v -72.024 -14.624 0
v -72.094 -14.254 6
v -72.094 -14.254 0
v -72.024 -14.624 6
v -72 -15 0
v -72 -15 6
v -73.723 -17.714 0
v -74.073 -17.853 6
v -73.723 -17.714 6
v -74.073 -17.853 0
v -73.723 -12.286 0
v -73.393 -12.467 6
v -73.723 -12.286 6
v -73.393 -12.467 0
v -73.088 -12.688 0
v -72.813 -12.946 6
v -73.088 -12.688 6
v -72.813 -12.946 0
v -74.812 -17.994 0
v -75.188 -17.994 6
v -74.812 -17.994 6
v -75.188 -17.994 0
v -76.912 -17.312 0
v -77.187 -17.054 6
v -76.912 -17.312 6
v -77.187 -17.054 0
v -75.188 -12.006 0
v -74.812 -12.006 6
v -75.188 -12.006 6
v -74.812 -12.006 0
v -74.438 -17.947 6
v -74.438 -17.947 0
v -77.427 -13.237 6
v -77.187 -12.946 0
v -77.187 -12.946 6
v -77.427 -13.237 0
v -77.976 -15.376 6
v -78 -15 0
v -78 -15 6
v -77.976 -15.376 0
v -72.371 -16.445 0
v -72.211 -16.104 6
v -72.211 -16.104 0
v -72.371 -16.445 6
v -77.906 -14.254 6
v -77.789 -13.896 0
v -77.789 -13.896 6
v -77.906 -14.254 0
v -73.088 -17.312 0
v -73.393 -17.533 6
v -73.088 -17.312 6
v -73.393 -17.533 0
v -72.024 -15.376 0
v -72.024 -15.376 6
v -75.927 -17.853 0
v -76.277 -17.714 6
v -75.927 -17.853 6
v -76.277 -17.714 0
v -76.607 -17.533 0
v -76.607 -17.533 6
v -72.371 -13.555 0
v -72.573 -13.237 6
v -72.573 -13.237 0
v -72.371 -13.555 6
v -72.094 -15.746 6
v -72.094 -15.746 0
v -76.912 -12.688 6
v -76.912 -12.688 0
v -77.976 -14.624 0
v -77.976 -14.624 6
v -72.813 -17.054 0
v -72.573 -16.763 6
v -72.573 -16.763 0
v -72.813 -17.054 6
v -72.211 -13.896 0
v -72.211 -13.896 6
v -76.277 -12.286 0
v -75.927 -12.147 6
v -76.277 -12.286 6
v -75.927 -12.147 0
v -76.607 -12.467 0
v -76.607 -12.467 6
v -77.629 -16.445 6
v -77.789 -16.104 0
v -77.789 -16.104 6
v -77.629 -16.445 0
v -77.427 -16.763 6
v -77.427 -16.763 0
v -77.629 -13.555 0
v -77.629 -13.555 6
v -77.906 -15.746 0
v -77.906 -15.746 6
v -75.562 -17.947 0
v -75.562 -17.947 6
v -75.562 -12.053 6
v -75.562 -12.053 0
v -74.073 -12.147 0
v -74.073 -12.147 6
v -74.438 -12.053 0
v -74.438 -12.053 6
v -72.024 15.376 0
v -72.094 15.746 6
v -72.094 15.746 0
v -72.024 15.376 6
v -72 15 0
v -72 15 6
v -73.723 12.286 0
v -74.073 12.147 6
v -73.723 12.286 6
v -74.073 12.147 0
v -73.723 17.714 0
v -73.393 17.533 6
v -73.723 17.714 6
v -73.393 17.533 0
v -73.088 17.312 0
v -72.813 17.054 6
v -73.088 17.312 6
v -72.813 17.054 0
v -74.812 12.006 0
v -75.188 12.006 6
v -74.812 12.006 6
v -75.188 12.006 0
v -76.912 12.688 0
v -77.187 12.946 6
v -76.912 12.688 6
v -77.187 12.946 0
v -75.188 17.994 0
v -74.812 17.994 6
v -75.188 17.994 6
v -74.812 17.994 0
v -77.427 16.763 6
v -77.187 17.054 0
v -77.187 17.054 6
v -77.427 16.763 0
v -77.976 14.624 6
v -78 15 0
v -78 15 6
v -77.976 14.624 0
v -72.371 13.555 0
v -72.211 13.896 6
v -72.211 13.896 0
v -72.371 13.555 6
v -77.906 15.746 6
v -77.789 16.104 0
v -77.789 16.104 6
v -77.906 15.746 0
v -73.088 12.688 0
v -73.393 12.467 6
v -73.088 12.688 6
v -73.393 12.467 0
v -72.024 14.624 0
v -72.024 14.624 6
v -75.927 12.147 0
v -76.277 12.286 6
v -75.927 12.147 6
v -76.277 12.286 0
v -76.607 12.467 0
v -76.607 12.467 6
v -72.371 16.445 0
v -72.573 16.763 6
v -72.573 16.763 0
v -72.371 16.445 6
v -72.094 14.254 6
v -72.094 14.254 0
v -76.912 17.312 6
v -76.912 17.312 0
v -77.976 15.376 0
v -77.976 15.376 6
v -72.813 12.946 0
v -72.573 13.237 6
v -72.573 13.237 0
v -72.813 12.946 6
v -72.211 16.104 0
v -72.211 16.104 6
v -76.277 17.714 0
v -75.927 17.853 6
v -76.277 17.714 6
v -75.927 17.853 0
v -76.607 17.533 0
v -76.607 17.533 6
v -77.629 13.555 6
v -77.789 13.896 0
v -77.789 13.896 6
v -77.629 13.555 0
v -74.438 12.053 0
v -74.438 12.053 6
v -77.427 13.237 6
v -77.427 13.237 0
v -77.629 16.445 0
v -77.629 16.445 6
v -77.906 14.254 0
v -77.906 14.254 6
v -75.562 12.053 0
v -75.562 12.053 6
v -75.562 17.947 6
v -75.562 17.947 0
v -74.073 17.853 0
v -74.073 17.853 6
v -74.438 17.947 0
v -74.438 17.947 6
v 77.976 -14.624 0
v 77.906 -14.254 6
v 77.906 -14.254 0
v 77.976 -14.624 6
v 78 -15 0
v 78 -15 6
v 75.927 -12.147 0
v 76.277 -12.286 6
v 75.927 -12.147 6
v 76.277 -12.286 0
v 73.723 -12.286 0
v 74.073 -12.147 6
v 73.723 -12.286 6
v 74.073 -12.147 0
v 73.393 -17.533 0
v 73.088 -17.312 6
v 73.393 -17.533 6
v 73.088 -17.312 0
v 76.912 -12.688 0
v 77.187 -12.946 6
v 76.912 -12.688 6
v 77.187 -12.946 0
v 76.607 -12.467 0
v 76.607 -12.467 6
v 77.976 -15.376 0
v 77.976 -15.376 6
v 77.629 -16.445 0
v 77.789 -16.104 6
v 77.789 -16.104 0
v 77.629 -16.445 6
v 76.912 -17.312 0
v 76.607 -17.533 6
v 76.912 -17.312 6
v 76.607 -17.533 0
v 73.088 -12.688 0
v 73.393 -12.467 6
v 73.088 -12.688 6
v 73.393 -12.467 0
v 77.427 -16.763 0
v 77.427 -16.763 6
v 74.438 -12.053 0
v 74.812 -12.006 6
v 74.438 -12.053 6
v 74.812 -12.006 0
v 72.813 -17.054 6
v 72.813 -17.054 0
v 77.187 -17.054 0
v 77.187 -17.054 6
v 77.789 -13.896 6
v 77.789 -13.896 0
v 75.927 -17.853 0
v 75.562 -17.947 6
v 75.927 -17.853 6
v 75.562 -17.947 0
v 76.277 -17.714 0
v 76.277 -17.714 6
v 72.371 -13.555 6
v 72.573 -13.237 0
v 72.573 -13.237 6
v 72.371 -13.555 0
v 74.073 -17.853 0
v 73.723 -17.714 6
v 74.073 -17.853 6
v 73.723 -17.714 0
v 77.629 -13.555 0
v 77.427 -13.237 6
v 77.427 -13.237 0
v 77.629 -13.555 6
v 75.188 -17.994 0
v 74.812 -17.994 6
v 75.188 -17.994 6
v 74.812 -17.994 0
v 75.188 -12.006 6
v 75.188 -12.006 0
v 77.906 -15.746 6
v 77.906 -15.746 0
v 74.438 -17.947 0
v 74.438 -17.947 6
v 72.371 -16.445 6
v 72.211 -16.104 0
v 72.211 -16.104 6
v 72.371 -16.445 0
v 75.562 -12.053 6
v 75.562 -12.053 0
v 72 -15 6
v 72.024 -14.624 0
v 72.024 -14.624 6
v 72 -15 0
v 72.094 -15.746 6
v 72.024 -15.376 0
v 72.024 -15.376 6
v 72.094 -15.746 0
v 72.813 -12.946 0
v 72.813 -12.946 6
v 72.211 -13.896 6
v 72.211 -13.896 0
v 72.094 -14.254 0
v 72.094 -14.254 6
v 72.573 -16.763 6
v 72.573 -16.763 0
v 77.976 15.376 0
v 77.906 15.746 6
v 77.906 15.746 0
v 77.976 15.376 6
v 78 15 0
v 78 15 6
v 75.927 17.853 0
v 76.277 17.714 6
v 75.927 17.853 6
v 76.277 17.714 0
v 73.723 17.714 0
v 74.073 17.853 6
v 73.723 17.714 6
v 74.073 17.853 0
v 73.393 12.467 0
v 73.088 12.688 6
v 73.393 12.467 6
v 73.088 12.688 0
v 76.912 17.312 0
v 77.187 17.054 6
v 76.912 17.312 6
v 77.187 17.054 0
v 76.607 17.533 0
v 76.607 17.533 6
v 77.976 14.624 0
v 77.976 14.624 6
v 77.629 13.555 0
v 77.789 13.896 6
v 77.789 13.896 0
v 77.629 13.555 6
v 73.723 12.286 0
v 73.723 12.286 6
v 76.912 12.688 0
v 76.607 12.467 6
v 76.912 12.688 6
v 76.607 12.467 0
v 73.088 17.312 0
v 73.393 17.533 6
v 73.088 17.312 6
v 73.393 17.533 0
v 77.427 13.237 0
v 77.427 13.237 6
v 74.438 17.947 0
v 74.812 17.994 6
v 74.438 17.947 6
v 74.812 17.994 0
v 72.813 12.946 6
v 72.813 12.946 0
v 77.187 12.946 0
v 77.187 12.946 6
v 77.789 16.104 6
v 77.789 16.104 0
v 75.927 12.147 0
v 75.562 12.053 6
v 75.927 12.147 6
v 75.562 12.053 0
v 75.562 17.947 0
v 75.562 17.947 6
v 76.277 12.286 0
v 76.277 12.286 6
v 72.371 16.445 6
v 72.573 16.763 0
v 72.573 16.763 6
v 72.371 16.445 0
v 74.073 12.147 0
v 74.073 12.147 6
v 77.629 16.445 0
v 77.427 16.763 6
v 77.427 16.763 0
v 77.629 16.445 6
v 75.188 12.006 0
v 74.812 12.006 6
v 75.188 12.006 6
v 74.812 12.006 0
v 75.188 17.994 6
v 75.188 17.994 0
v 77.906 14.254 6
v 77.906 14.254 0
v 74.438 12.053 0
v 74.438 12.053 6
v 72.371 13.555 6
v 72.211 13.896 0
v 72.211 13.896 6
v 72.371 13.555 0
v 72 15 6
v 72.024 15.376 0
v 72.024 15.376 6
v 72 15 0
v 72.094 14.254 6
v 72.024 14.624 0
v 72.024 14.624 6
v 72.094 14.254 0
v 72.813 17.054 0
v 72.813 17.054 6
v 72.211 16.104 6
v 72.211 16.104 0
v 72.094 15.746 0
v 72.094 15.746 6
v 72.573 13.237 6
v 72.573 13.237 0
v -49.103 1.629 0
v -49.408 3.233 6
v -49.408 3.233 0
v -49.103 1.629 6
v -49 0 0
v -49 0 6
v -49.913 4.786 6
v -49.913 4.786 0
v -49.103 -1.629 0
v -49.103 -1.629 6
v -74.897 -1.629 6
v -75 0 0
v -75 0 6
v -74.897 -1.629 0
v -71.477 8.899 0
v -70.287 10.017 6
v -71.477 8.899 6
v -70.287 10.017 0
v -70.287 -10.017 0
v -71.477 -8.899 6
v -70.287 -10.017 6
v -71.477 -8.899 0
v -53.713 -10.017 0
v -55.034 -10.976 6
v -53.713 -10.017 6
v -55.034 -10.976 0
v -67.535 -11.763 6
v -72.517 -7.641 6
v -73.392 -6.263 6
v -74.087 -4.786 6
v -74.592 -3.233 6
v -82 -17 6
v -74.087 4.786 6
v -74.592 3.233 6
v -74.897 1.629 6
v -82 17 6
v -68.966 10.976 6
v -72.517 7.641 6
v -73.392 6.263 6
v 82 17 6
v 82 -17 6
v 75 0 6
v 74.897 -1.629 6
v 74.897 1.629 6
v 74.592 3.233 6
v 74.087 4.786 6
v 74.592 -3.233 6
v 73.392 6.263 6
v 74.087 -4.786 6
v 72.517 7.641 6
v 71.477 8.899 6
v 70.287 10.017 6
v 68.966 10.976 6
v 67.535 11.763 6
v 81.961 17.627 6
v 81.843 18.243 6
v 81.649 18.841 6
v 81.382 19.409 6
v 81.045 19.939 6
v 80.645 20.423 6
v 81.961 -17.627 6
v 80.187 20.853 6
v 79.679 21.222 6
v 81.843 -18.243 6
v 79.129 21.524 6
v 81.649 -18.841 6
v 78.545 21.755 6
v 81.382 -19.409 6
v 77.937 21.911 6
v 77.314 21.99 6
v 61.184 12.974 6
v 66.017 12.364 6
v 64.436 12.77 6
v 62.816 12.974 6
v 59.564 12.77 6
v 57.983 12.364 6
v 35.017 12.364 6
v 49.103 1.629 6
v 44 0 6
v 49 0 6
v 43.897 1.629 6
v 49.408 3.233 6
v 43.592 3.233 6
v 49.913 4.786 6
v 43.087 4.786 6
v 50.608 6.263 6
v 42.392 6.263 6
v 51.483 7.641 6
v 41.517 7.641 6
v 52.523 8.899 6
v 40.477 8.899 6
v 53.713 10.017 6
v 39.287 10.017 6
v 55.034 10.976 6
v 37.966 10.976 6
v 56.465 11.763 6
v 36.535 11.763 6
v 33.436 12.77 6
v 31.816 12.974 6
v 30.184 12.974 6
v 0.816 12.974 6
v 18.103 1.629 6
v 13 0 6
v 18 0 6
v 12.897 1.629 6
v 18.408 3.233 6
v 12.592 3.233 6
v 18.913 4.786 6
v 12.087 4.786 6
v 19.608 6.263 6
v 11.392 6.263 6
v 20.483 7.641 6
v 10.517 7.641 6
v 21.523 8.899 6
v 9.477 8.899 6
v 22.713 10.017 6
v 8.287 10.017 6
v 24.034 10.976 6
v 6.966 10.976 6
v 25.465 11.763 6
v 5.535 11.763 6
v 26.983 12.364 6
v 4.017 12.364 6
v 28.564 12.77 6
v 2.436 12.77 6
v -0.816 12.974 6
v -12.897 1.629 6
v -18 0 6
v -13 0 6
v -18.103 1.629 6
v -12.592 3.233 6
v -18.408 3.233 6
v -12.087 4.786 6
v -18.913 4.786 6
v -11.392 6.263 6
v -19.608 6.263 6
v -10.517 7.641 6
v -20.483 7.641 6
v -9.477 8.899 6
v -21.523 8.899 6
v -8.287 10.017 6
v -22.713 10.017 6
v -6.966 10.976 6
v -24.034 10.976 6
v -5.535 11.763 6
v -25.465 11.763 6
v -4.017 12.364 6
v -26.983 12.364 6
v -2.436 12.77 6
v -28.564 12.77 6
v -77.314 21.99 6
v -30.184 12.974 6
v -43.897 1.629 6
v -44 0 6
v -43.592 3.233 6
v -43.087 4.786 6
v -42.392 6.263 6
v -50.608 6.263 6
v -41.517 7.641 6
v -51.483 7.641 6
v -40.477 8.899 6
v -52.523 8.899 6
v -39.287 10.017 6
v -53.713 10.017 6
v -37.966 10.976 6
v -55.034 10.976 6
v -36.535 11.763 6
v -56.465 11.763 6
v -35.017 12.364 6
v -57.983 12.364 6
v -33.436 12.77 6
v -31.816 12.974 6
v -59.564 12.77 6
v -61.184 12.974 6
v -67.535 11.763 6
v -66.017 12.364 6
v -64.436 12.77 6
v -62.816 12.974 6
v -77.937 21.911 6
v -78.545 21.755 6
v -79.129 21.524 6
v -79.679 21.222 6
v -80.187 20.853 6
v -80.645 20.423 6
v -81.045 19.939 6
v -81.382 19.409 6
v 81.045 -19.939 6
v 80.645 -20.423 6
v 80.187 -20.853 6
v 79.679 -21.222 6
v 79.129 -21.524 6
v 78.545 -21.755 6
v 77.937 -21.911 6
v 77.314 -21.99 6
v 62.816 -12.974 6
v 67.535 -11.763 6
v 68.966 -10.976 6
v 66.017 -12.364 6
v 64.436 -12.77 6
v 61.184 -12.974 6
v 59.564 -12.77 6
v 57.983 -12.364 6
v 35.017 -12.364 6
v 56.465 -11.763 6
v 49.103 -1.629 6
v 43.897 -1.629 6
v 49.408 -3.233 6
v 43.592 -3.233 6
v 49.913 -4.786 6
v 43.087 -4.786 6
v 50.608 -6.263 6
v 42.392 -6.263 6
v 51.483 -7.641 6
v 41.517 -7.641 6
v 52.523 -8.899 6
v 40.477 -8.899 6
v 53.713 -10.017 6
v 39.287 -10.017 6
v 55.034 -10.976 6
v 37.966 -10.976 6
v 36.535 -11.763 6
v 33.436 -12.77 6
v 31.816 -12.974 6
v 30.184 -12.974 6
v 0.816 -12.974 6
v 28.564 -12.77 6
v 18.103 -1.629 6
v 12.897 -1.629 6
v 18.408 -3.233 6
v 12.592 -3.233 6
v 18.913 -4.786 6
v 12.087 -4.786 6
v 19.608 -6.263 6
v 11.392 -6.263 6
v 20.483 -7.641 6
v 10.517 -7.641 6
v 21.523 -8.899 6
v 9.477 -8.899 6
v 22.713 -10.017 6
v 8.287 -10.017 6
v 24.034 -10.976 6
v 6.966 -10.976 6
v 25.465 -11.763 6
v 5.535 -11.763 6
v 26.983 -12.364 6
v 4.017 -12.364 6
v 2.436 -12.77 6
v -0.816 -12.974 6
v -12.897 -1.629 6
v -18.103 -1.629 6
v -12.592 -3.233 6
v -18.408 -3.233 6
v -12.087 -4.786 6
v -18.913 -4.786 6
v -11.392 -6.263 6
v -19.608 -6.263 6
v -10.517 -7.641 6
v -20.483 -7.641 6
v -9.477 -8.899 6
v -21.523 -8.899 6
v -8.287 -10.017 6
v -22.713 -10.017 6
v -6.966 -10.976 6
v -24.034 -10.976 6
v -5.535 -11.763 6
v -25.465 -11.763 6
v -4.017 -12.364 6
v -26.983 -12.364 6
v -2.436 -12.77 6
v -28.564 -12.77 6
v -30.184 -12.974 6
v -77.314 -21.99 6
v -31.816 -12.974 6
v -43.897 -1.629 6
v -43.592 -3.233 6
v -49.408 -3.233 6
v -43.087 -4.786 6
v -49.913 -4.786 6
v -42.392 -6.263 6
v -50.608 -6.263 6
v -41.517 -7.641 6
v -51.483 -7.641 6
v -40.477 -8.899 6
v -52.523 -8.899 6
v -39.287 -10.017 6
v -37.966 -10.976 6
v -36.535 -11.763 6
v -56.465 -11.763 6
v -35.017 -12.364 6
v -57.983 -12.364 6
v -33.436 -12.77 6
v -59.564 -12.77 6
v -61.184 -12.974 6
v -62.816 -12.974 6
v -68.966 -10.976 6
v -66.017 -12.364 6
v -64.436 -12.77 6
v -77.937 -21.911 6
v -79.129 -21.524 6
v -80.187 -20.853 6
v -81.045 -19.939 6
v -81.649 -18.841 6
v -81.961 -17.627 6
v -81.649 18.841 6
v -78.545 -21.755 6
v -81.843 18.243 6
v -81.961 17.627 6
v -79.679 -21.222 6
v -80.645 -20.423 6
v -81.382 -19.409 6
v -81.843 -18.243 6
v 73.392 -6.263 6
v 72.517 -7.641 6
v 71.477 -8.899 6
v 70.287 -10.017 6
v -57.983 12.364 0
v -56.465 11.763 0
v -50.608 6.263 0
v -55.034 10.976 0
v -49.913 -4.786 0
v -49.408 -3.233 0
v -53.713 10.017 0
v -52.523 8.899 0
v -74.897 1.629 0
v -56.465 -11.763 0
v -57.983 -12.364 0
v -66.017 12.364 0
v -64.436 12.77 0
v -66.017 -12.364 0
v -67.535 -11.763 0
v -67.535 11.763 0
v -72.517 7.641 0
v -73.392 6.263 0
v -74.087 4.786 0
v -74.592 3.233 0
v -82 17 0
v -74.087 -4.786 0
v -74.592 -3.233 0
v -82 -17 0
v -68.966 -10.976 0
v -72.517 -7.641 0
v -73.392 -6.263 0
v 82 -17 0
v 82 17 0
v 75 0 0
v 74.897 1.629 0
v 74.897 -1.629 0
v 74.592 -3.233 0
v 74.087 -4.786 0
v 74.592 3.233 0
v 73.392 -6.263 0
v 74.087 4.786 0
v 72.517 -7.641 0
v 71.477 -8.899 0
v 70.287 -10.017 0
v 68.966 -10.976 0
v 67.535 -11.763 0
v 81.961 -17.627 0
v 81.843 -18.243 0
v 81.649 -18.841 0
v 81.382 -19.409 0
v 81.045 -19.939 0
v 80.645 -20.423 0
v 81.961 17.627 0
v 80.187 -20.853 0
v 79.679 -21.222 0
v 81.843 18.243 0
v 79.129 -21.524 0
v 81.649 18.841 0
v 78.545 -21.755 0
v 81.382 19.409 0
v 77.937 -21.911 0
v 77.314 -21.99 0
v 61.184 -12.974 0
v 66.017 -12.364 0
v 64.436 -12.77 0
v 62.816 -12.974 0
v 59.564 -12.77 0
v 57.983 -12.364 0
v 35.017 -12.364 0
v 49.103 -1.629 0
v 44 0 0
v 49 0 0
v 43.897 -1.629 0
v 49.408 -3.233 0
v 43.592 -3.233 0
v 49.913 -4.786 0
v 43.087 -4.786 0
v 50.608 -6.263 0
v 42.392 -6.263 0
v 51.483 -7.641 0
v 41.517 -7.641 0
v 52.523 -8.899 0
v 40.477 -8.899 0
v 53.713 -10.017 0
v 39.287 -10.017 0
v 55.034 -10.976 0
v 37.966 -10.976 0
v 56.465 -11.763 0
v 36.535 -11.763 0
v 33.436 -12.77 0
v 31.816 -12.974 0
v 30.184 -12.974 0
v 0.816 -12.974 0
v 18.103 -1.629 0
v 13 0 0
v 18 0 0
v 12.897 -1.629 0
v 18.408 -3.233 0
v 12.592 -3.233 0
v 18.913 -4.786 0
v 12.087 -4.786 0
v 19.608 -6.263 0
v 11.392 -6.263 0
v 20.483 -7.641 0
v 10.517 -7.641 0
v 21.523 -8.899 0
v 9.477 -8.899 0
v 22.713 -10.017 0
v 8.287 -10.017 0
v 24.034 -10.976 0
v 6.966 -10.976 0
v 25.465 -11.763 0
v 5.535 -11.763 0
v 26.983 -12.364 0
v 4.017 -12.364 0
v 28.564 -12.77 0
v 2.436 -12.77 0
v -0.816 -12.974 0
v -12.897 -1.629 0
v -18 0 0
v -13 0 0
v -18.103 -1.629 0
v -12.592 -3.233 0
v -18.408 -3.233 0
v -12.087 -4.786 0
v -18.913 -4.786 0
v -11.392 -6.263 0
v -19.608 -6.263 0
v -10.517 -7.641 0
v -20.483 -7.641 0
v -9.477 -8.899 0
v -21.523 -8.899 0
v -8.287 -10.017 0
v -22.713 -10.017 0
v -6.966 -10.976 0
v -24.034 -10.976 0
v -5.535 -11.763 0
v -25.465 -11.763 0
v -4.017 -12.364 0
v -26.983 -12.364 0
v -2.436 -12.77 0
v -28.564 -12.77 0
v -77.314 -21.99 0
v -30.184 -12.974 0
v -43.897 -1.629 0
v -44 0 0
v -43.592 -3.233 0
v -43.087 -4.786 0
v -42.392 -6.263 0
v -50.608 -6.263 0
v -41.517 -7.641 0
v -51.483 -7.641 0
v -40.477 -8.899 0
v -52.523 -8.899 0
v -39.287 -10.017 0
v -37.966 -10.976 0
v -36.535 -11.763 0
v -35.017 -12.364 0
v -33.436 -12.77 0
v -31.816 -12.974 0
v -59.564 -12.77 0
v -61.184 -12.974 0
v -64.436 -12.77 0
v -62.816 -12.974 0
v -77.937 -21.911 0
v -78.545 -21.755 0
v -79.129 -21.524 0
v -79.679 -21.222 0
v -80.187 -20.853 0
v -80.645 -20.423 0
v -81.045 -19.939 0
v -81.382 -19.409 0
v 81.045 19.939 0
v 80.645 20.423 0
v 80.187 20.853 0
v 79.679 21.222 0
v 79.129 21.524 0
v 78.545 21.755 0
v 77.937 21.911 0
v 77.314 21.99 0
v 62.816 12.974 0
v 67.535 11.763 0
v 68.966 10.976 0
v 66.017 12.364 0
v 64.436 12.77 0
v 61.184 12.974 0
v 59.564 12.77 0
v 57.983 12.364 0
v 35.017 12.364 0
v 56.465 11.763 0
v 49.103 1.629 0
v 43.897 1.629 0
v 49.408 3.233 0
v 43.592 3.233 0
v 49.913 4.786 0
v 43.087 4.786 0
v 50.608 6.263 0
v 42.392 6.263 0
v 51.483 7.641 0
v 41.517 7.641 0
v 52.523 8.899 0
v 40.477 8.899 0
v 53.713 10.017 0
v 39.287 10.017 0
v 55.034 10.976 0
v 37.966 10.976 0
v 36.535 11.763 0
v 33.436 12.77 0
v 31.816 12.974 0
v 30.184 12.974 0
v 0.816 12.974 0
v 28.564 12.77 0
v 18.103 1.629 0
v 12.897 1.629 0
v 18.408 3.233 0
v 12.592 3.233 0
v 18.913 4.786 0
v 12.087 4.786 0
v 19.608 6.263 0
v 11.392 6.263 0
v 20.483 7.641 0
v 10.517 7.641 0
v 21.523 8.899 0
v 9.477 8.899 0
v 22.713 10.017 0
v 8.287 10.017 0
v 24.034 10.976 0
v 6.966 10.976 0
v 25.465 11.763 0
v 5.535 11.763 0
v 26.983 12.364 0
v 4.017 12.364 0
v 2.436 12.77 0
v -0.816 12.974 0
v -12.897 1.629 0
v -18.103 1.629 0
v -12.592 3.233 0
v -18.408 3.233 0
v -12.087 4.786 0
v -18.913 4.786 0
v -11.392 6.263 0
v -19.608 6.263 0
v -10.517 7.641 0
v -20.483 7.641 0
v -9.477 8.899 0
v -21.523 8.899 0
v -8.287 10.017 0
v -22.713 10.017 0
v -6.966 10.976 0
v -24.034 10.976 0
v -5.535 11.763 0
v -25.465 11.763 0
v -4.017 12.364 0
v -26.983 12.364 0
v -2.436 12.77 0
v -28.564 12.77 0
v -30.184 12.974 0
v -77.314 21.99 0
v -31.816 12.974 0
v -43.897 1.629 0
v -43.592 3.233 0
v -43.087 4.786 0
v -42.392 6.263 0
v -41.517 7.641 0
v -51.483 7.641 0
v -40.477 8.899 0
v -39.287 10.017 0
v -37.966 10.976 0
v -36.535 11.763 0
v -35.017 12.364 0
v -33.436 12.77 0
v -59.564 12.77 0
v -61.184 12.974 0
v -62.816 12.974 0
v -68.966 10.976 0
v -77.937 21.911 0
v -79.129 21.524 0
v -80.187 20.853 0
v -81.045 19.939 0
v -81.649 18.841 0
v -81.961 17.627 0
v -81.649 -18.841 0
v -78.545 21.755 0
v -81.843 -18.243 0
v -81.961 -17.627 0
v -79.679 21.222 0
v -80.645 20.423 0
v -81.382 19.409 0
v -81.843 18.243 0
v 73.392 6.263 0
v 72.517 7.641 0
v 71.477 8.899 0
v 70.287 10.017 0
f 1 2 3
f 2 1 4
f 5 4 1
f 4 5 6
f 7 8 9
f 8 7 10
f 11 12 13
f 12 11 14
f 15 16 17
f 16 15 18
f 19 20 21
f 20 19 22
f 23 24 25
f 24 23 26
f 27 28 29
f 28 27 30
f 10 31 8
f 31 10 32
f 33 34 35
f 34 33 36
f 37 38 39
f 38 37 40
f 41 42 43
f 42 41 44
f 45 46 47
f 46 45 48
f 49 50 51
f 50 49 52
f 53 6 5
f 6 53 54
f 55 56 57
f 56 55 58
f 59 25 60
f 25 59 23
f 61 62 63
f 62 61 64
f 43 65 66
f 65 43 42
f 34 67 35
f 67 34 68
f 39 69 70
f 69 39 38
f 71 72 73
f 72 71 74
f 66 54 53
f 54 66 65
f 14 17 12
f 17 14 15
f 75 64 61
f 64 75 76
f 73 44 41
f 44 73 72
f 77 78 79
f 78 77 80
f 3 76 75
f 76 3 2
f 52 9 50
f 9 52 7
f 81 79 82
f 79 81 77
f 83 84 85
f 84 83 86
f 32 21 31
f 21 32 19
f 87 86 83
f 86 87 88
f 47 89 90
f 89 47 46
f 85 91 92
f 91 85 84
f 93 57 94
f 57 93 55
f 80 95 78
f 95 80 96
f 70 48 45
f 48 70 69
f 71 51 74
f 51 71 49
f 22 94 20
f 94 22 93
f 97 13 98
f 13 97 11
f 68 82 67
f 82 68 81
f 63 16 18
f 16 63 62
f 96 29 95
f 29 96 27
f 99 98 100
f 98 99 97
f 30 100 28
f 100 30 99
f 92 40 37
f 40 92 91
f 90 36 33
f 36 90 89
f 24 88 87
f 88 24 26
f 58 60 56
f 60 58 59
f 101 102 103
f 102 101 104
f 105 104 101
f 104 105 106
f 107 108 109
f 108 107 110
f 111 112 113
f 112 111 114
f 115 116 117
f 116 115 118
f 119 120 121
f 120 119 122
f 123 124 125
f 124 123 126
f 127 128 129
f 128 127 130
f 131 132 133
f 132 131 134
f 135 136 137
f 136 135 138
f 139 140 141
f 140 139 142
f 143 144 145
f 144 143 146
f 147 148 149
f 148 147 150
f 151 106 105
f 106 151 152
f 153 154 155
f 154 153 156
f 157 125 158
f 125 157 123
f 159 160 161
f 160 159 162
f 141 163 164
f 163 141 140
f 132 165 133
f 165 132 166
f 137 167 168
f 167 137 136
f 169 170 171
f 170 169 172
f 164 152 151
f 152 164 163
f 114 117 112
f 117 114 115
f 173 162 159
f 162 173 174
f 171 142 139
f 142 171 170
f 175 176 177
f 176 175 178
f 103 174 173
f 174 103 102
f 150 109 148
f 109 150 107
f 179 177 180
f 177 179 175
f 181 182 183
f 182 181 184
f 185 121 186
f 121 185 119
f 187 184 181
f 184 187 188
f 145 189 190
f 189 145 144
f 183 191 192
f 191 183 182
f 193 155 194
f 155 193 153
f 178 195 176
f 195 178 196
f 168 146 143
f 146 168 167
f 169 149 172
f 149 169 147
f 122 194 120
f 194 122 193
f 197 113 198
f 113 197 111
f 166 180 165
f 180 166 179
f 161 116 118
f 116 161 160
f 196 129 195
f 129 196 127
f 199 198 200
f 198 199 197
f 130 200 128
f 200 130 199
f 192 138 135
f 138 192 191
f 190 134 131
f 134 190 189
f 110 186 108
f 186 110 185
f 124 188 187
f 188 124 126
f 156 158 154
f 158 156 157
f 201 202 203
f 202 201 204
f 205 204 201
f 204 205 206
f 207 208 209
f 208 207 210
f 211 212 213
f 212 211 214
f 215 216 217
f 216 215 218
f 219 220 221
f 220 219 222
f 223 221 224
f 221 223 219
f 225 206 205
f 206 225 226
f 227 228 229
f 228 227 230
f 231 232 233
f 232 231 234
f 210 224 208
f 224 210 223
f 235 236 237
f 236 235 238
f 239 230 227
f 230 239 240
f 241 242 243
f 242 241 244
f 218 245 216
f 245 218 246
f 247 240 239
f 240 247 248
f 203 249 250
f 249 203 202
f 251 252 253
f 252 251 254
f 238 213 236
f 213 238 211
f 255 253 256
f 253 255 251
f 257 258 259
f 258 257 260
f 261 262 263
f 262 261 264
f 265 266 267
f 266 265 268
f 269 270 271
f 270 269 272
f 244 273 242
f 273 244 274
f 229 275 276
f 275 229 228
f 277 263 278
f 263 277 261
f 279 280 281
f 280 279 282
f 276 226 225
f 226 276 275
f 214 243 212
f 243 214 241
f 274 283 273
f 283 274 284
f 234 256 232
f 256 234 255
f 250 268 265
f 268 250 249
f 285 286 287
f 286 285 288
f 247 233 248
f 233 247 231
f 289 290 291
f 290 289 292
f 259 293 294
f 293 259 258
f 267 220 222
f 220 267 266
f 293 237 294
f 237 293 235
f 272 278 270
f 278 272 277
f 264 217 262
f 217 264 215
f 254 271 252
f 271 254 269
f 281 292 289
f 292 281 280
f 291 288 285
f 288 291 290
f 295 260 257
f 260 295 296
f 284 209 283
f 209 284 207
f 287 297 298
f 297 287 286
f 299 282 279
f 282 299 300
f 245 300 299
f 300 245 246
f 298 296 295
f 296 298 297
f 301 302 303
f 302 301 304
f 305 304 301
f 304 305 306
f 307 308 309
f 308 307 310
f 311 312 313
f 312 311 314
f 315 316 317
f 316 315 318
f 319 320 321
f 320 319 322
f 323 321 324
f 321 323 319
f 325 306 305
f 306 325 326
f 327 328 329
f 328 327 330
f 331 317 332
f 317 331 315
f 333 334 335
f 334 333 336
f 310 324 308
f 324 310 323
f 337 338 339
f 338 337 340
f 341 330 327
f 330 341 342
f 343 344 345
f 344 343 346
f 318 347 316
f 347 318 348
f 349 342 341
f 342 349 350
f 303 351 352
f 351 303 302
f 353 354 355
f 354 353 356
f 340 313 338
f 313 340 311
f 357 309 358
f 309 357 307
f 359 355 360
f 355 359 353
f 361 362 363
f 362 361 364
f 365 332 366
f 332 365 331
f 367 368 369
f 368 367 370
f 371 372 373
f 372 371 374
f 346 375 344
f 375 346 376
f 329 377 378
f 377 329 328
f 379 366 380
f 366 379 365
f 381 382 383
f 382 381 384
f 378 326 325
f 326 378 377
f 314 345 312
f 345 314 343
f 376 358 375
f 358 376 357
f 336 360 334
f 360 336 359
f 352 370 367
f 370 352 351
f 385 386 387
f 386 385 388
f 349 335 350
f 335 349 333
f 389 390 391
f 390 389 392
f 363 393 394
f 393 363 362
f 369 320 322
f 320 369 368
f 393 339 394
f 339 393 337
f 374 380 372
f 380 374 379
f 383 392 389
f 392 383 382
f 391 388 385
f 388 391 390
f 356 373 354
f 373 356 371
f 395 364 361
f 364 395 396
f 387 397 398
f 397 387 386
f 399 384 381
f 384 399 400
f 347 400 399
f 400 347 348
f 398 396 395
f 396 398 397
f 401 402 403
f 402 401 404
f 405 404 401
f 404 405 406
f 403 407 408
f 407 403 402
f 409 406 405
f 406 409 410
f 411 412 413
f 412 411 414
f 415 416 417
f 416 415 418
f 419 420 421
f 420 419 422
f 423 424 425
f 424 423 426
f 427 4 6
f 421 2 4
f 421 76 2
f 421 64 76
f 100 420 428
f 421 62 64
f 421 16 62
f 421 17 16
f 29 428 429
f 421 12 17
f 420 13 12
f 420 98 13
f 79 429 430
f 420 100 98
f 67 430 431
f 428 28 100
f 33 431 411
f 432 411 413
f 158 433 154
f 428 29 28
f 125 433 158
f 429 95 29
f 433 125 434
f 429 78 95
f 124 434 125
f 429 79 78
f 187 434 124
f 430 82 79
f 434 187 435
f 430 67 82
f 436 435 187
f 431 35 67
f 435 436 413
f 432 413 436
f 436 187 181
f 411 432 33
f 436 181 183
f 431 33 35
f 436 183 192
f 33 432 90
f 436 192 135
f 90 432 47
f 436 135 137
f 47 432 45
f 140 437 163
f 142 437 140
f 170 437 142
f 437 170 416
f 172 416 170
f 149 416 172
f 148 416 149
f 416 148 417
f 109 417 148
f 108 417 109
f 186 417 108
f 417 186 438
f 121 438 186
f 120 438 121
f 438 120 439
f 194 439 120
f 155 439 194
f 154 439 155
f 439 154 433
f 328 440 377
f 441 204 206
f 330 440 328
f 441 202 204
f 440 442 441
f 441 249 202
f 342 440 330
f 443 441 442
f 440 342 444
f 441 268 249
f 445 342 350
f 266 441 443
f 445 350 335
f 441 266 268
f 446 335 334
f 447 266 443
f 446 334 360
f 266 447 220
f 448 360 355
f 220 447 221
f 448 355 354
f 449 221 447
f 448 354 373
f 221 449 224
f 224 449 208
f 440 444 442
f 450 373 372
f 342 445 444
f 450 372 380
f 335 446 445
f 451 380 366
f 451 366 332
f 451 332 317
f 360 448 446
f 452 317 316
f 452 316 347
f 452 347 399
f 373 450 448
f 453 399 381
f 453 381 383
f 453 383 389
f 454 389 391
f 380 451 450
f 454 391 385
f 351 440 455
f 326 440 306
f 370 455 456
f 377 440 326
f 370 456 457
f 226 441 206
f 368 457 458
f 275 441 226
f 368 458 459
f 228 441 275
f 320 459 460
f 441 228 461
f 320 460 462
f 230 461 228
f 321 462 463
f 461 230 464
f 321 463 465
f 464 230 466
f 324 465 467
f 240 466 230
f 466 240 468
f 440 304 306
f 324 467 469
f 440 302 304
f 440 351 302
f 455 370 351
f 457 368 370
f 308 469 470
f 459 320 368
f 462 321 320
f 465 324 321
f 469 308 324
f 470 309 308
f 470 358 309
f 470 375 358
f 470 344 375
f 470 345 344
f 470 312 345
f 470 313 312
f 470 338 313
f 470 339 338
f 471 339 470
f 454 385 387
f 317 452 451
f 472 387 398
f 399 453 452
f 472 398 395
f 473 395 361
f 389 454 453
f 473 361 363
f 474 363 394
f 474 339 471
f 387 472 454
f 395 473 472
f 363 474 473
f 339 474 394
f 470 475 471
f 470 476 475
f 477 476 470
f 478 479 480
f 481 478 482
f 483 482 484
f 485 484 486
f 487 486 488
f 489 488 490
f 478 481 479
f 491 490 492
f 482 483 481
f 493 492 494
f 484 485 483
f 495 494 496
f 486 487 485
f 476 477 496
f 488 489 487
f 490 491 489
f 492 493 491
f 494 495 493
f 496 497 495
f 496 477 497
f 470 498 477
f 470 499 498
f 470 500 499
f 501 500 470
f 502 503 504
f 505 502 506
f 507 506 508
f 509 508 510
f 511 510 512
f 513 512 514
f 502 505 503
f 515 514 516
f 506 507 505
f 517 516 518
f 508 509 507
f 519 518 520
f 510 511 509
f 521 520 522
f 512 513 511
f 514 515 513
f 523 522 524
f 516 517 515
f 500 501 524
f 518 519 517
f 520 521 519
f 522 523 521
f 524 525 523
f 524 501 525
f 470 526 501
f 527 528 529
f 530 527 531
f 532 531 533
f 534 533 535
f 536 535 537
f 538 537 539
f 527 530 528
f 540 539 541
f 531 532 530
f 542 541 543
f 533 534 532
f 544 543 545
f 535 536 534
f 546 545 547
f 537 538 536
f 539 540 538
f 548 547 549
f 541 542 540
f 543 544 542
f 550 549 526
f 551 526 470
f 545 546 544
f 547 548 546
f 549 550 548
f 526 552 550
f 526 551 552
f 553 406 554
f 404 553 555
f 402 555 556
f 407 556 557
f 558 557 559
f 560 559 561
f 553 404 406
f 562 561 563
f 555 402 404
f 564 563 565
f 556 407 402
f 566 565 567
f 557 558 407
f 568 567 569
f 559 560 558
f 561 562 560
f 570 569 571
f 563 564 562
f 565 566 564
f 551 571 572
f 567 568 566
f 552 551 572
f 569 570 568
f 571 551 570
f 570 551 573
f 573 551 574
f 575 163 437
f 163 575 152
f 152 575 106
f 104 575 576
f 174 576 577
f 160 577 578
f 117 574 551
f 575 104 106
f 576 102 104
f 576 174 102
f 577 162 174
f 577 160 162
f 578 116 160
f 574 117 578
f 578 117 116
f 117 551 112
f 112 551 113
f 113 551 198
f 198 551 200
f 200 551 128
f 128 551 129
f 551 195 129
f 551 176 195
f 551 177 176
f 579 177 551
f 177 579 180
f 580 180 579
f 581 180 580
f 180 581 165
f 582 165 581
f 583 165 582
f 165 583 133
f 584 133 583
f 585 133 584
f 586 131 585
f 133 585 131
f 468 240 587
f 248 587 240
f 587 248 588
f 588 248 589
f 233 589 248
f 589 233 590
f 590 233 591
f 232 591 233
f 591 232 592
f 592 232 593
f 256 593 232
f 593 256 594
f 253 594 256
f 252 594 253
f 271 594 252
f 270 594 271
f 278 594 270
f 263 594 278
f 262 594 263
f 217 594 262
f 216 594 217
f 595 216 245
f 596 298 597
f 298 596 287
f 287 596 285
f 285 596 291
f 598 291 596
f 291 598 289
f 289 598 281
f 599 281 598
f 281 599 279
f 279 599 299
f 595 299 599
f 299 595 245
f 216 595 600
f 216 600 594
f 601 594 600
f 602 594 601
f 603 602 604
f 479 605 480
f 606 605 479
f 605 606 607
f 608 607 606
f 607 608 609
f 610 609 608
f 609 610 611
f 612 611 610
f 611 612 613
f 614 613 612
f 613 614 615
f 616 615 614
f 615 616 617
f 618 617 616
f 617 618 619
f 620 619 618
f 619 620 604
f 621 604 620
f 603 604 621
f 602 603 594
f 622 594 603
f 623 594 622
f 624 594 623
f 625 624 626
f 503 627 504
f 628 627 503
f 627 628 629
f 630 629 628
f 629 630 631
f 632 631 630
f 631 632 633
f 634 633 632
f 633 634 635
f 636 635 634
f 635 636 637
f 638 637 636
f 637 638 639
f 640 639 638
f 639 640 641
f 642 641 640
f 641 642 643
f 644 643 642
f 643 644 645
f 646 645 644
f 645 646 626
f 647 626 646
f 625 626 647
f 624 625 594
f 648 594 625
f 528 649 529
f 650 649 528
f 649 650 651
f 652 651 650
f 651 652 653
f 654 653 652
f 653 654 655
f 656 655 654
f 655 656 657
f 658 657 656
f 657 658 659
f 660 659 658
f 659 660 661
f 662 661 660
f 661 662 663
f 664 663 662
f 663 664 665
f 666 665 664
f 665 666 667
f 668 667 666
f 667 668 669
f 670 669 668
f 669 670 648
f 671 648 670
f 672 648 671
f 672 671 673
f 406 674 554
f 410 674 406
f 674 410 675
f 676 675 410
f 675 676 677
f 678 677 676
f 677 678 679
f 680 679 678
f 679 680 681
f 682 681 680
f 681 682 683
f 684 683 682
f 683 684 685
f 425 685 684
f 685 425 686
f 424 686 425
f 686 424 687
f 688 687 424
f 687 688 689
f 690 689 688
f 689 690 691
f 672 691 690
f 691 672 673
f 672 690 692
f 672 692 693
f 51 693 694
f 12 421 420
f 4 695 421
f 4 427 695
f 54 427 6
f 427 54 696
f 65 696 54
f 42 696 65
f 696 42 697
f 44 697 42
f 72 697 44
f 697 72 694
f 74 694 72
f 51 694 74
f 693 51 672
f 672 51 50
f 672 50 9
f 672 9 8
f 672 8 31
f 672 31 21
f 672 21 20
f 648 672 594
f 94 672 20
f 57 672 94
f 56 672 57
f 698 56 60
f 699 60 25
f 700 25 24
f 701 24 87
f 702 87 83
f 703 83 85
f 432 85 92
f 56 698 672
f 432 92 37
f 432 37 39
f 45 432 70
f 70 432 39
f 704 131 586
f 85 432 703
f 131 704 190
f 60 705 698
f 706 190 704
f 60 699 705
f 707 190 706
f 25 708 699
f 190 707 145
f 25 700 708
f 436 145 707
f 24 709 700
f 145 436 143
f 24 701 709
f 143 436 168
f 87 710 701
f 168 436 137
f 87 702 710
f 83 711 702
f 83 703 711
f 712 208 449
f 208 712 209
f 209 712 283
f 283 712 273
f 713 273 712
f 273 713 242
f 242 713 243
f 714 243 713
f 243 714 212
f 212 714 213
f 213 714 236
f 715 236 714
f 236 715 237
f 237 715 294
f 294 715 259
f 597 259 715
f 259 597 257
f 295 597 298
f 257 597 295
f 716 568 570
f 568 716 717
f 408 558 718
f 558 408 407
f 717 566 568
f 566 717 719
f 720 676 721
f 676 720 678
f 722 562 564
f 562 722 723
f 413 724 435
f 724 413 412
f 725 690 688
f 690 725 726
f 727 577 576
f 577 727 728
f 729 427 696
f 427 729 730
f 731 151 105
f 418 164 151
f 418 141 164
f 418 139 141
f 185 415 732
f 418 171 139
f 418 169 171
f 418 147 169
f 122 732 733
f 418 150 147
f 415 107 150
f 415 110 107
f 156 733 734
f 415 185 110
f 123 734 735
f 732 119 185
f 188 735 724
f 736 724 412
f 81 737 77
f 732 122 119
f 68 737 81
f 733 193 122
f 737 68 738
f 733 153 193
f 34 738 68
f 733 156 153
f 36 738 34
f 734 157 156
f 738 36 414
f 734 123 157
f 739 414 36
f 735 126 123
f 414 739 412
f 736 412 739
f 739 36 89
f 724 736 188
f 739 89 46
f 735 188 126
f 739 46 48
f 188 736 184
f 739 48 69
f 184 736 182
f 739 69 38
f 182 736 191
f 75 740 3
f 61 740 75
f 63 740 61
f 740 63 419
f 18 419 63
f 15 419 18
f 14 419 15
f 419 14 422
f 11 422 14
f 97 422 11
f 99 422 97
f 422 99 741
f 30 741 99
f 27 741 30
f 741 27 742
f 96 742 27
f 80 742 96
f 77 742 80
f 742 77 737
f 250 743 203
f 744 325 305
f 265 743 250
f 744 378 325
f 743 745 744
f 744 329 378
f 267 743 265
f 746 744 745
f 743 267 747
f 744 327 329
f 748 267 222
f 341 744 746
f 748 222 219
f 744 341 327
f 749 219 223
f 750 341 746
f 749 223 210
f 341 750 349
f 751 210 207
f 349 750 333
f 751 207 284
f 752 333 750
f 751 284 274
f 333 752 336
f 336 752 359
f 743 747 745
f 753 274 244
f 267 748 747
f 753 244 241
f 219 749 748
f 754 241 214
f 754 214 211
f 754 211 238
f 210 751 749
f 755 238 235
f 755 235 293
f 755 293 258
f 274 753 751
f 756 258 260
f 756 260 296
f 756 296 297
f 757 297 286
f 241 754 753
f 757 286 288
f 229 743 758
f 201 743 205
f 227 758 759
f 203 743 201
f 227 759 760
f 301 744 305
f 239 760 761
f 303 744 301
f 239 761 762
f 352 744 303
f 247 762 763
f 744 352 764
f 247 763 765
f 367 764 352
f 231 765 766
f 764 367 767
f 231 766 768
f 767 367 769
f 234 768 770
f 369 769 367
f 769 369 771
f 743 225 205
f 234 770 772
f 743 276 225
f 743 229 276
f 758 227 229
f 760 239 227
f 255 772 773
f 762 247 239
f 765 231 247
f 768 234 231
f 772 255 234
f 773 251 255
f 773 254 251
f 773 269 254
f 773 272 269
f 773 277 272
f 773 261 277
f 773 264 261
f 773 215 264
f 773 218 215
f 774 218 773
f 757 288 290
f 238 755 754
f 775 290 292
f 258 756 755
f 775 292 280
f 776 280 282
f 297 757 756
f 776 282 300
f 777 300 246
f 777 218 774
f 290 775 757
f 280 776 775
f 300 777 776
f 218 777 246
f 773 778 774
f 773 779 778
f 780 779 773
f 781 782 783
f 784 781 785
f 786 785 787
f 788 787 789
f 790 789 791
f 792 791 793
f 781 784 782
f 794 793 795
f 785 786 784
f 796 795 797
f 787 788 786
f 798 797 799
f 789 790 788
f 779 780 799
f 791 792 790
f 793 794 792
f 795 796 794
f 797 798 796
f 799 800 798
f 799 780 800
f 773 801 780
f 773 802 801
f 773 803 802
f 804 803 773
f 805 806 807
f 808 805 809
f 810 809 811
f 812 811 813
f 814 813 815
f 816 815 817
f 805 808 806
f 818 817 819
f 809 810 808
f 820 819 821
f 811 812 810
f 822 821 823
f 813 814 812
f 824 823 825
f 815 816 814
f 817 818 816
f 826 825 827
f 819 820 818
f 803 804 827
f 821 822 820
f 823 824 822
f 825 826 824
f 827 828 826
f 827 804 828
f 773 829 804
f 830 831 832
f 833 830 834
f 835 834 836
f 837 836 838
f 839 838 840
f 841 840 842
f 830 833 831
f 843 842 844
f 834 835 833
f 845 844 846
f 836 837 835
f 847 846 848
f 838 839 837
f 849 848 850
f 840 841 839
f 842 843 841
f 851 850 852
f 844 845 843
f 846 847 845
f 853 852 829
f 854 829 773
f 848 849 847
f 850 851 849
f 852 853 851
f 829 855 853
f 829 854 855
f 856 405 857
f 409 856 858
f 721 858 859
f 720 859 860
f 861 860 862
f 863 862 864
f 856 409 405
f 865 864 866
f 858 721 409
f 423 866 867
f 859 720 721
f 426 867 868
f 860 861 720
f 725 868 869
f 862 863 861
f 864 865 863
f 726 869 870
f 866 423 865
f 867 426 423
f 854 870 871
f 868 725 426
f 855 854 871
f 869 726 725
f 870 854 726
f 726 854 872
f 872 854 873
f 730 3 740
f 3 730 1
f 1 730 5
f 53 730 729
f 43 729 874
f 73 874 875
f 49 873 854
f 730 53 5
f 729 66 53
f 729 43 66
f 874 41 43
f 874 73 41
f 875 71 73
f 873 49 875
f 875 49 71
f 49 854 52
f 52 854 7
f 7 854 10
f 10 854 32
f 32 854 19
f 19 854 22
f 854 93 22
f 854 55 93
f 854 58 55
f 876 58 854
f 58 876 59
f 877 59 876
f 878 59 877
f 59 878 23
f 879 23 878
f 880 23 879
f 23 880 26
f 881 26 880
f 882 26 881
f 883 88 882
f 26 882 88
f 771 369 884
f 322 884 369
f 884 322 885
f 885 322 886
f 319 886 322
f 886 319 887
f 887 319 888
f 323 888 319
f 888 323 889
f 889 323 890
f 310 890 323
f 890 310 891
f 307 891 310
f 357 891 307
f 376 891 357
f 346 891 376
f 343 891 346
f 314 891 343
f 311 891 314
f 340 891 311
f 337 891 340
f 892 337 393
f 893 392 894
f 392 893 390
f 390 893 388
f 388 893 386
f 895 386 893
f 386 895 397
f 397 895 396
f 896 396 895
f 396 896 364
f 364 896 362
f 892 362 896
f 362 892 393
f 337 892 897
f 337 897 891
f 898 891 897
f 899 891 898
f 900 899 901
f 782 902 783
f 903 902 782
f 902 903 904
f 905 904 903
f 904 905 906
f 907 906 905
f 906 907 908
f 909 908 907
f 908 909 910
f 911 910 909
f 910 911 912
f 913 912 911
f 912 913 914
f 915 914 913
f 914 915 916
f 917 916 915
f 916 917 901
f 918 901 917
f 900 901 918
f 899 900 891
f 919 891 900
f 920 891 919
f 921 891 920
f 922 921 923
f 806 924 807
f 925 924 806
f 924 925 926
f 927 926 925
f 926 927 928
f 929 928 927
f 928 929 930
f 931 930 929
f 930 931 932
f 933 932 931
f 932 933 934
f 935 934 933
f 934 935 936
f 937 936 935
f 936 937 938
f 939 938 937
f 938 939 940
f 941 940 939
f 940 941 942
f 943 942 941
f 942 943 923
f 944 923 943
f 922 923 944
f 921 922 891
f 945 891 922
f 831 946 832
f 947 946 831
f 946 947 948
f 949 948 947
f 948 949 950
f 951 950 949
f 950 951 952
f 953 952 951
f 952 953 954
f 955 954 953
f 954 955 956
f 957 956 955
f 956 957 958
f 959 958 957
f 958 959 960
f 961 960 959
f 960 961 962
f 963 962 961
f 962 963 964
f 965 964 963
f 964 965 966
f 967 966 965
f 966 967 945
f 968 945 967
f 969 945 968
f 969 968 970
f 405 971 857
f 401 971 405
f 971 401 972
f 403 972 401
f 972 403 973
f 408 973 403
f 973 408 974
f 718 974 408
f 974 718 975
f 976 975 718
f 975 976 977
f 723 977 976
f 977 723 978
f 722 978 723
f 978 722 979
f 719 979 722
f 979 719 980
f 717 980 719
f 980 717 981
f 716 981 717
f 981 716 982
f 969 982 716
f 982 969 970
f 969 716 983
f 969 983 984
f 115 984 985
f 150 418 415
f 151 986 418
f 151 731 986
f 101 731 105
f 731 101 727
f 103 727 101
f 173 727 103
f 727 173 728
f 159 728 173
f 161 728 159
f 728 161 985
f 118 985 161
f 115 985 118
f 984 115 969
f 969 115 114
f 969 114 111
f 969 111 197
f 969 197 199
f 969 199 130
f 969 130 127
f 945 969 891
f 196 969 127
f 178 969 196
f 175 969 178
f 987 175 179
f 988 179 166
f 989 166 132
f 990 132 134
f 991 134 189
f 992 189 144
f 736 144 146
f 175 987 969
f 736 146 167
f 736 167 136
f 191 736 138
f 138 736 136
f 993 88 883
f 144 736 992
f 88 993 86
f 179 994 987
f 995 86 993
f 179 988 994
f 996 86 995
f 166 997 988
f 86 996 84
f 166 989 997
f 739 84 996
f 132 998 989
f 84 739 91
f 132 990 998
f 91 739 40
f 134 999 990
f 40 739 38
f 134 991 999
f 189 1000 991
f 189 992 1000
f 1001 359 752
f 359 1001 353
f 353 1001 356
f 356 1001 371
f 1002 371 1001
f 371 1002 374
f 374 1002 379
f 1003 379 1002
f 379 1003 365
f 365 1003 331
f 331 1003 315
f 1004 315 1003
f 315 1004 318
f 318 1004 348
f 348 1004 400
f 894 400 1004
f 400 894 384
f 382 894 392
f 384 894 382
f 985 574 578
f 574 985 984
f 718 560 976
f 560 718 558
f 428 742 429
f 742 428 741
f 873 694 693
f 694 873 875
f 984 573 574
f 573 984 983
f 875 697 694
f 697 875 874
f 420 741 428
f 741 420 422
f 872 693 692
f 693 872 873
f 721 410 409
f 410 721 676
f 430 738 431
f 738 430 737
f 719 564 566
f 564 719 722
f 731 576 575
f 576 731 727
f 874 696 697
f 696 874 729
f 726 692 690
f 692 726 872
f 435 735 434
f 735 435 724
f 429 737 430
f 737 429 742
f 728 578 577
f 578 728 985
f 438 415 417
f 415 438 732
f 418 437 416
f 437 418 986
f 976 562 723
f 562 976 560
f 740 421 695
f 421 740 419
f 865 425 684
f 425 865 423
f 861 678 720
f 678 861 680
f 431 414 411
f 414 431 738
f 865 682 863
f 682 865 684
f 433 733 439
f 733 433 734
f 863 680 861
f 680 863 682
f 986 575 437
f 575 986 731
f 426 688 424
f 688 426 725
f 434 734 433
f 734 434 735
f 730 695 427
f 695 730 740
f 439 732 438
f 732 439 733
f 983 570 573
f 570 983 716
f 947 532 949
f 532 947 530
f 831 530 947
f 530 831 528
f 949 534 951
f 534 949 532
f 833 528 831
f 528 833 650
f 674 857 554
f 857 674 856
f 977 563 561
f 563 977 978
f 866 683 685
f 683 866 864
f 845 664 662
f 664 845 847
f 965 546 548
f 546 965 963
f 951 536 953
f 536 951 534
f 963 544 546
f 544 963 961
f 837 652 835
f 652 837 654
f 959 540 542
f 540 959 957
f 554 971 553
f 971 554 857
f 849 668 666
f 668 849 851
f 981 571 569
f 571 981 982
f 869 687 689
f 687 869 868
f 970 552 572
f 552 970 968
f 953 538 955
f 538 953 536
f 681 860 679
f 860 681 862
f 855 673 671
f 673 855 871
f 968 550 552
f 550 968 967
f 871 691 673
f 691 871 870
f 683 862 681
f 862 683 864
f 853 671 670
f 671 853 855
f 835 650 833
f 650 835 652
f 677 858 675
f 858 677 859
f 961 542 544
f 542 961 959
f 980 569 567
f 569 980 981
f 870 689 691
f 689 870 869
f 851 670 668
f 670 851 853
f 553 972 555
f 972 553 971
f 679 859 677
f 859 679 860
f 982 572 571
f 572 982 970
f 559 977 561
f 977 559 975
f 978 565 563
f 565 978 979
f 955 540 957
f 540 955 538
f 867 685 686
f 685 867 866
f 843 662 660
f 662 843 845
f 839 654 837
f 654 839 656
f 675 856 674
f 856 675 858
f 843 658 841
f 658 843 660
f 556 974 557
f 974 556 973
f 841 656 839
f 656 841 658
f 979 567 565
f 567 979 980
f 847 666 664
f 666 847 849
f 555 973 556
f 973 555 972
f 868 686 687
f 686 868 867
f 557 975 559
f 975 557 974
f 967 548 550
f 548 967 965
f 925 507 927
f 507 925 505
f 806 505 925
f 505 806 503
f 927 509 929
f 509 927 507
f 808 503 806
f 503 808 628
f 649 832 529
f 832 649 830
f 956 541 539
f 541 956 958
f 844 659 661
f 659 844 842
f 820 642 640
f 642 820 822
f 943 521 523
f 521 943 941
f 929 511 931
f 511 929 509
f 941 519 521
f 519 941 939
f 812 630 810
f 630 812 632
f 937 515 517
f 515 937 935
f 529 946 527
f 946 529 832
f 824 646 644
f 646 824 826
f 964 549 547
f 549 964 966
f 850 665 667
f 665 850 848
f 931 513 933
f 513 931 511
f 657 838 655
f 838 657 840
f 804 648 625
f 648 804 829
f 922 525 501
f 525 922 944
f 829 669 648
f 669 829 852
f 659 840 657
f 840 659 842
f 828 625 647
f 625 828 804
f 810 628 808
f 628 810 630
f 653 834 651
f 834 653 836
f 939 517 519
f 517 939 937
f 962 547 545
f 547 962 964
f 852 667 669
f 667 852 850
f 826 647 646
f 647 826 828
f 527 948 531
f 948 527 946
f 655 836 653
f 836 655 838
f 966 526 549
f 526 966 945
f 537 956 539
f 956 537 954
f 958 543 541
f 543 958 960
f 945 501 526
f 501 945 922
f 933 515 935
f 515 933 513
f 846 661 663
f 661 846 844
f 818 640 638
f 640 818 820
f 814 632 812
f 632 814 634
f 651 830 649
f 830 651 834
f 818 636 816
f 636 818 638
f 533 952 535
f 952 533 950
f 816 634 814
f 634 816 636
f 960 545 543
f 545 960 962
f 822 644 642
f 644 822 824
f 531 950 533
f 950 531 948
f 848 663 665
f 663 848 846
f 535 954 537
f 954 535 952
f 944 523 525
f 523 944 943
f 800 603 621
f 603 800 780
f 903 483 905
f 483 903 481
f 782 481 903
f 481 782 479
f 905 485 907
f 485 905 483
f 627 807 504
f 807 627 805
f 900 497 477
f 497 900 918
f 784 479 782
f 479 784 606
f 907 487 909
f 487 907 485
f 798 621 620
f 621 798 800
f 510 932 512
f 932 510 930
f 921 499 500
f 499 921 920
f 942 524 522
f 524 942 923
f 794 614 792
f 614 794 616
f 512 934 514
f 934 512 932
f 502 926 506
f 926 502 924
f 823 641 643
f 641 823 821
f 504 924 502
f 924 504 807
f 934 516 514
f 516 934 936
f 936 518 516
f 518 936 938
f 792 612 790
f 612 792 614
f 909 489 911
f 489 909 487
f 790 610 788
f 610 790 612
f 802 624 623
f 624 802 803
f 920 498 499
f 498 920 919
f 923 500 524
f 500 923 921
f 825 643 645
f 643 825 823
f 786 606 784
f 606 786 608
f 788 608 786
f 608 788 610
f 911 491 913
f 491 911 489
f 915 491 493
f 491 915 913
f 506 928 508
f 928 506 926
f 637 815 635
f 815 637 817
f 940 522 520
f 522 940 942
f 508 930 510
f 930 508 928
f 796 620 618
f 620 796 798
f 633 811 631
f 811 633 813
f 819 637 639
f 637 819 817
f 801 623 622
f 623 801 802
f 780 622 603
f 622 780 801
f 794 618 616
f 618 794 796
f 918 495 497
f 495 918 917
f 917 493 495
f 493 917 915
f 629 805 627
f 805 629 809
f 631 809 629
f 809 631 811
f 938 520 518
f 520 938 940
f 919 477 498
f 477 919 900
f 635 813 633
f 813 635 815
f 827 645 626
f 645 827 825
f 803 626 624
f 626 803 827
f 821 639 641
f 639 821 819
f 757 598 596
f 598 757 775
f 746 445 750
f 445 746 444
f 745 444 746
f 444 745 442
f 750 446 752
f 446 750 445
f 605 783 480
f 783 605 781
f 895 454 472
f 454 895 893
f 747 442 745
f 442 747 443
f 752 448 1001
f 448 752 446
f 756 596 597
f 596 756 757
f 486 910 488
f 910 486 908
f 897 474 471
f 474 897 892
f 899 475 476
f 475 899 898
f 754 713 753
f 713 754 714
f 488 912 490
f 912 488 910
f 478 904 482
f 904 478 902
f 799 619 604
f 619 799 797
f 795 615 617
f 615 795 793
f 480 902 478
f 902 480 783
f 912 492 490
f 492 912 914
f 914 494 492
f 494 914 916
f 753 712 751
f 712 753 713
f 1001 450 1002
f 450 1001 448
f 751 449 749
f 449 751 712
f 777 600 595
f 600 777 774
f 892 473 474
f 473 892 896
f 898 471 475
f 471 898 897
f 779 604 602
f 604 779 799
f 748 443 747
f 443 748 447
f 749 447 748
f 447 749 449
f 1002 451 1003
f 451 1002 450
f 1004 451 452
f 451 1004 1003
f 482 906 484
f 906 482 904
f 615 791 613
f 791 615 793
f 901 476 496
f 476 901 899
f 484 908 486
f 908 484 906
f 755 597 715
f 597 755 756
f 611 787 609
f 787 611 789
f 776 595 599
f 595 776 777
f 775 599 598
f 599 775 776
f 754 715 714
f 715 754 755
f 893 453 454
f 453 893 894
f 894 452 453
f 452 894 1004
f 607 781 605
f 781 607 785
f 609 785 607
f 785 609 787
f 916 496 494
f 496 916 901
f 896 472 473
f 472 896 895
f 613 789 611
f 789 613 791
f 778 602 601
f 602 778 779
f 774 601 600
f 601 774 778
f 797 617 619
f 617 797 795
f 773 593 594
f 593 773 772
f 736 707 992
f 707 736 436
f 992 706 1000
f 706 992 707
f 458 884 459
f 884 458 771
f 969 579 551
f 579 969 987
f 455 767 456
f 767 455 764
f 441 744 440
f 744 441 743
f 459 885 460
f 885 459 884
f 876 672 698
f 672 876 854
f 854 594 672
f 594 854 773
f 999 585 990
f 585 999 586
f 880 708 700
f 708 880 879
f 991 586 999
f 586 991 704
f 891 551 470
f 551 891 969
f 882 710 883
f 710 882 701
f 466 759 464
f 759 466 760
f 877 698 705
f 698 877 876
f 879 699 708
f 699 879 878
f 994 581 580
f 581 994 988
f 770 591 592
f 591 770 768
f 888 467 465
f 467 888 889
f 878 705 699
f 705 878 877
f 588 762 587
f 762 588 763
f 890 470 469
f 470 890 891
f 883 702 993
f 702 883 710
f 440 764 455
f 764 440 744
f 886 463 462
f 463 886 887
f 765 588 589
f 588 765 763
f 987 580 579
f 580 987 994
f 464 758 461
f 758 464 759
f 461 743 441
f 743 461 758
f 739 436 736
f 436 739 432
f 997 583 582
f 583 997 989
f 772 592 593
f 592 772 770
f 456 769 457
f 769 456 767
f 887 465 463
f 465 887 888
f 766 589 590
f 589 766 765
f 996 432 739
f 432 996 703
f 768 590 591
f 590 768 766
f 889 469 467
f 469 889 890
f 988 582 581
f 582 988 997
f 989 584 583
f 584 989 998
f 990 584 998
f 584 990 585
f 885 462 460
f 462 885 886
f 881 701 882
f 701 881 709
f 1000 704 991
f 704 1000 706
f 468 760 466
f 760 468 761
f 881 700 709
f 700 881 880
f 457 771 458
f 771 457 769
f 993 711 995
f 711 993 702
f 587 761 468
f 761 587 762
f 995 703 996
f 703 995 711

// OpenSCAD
$fn = 50;


difference() {
	union() {
		hull() {
			translate(v = [-77.0000000000, 17.0000000000, 0]) {
				cylinder(h = 6, r = 5);
			}
			translate(v = [77.0000000000, 17.0000000000, 0]) {
				cylinder(h = 6, r = 5);
			}
			translate(v = [-77.0000000000, -17.0000000000, 0]) {
				cylinder(h = 6, r = 5);
			}
			translate(v = [77.0000000000, -17.0000000000, 0]) {
				cylinder(h = 6, r = 5);
			}
		}
	}
	union() {
		#translate(v = [-75.0000000000, -15.0000000000, -100.0000000000]) {
			cylinder(h = 200, r = 3.0000000000);
		}
		#translate(v = [-75.0000000000, 15.0000000000, -100.0000000000]) {
			cylinder(h = 200, r = 3.0000000000);
		}
		#translate(v = [75.0000000000, -15.0000000000, -100.0000000000]) {
			cylinder(h = 200, r = 3.0000000000);
		}
		#translate(v = [75.0000000000, 15.0000000000, -100.0000000000]) {
			cylinder(h = 200, r = 3.0000000000);
		}
		#translate(v = [-62.0000000000, 0, 0]) {
			cylinder(h = 6, r = 13.0000000000);
		}
		#translate(v = [-31.0000000000, 0, 0]) {
			cylinder(h = 6, r = 13.0000000000);
		}
		#cylinder(h = 6, r = 13.0000000000);
		#translate(v = [31.0000000000, 0, 0]) {
			cylinder(h = 6, r = 13.0000000000);
		}
		#translate(v = [62.0000000000, 0, 0]) {
			cylinder(h = 6, r = 13.0000000000);
		}
	}
}
